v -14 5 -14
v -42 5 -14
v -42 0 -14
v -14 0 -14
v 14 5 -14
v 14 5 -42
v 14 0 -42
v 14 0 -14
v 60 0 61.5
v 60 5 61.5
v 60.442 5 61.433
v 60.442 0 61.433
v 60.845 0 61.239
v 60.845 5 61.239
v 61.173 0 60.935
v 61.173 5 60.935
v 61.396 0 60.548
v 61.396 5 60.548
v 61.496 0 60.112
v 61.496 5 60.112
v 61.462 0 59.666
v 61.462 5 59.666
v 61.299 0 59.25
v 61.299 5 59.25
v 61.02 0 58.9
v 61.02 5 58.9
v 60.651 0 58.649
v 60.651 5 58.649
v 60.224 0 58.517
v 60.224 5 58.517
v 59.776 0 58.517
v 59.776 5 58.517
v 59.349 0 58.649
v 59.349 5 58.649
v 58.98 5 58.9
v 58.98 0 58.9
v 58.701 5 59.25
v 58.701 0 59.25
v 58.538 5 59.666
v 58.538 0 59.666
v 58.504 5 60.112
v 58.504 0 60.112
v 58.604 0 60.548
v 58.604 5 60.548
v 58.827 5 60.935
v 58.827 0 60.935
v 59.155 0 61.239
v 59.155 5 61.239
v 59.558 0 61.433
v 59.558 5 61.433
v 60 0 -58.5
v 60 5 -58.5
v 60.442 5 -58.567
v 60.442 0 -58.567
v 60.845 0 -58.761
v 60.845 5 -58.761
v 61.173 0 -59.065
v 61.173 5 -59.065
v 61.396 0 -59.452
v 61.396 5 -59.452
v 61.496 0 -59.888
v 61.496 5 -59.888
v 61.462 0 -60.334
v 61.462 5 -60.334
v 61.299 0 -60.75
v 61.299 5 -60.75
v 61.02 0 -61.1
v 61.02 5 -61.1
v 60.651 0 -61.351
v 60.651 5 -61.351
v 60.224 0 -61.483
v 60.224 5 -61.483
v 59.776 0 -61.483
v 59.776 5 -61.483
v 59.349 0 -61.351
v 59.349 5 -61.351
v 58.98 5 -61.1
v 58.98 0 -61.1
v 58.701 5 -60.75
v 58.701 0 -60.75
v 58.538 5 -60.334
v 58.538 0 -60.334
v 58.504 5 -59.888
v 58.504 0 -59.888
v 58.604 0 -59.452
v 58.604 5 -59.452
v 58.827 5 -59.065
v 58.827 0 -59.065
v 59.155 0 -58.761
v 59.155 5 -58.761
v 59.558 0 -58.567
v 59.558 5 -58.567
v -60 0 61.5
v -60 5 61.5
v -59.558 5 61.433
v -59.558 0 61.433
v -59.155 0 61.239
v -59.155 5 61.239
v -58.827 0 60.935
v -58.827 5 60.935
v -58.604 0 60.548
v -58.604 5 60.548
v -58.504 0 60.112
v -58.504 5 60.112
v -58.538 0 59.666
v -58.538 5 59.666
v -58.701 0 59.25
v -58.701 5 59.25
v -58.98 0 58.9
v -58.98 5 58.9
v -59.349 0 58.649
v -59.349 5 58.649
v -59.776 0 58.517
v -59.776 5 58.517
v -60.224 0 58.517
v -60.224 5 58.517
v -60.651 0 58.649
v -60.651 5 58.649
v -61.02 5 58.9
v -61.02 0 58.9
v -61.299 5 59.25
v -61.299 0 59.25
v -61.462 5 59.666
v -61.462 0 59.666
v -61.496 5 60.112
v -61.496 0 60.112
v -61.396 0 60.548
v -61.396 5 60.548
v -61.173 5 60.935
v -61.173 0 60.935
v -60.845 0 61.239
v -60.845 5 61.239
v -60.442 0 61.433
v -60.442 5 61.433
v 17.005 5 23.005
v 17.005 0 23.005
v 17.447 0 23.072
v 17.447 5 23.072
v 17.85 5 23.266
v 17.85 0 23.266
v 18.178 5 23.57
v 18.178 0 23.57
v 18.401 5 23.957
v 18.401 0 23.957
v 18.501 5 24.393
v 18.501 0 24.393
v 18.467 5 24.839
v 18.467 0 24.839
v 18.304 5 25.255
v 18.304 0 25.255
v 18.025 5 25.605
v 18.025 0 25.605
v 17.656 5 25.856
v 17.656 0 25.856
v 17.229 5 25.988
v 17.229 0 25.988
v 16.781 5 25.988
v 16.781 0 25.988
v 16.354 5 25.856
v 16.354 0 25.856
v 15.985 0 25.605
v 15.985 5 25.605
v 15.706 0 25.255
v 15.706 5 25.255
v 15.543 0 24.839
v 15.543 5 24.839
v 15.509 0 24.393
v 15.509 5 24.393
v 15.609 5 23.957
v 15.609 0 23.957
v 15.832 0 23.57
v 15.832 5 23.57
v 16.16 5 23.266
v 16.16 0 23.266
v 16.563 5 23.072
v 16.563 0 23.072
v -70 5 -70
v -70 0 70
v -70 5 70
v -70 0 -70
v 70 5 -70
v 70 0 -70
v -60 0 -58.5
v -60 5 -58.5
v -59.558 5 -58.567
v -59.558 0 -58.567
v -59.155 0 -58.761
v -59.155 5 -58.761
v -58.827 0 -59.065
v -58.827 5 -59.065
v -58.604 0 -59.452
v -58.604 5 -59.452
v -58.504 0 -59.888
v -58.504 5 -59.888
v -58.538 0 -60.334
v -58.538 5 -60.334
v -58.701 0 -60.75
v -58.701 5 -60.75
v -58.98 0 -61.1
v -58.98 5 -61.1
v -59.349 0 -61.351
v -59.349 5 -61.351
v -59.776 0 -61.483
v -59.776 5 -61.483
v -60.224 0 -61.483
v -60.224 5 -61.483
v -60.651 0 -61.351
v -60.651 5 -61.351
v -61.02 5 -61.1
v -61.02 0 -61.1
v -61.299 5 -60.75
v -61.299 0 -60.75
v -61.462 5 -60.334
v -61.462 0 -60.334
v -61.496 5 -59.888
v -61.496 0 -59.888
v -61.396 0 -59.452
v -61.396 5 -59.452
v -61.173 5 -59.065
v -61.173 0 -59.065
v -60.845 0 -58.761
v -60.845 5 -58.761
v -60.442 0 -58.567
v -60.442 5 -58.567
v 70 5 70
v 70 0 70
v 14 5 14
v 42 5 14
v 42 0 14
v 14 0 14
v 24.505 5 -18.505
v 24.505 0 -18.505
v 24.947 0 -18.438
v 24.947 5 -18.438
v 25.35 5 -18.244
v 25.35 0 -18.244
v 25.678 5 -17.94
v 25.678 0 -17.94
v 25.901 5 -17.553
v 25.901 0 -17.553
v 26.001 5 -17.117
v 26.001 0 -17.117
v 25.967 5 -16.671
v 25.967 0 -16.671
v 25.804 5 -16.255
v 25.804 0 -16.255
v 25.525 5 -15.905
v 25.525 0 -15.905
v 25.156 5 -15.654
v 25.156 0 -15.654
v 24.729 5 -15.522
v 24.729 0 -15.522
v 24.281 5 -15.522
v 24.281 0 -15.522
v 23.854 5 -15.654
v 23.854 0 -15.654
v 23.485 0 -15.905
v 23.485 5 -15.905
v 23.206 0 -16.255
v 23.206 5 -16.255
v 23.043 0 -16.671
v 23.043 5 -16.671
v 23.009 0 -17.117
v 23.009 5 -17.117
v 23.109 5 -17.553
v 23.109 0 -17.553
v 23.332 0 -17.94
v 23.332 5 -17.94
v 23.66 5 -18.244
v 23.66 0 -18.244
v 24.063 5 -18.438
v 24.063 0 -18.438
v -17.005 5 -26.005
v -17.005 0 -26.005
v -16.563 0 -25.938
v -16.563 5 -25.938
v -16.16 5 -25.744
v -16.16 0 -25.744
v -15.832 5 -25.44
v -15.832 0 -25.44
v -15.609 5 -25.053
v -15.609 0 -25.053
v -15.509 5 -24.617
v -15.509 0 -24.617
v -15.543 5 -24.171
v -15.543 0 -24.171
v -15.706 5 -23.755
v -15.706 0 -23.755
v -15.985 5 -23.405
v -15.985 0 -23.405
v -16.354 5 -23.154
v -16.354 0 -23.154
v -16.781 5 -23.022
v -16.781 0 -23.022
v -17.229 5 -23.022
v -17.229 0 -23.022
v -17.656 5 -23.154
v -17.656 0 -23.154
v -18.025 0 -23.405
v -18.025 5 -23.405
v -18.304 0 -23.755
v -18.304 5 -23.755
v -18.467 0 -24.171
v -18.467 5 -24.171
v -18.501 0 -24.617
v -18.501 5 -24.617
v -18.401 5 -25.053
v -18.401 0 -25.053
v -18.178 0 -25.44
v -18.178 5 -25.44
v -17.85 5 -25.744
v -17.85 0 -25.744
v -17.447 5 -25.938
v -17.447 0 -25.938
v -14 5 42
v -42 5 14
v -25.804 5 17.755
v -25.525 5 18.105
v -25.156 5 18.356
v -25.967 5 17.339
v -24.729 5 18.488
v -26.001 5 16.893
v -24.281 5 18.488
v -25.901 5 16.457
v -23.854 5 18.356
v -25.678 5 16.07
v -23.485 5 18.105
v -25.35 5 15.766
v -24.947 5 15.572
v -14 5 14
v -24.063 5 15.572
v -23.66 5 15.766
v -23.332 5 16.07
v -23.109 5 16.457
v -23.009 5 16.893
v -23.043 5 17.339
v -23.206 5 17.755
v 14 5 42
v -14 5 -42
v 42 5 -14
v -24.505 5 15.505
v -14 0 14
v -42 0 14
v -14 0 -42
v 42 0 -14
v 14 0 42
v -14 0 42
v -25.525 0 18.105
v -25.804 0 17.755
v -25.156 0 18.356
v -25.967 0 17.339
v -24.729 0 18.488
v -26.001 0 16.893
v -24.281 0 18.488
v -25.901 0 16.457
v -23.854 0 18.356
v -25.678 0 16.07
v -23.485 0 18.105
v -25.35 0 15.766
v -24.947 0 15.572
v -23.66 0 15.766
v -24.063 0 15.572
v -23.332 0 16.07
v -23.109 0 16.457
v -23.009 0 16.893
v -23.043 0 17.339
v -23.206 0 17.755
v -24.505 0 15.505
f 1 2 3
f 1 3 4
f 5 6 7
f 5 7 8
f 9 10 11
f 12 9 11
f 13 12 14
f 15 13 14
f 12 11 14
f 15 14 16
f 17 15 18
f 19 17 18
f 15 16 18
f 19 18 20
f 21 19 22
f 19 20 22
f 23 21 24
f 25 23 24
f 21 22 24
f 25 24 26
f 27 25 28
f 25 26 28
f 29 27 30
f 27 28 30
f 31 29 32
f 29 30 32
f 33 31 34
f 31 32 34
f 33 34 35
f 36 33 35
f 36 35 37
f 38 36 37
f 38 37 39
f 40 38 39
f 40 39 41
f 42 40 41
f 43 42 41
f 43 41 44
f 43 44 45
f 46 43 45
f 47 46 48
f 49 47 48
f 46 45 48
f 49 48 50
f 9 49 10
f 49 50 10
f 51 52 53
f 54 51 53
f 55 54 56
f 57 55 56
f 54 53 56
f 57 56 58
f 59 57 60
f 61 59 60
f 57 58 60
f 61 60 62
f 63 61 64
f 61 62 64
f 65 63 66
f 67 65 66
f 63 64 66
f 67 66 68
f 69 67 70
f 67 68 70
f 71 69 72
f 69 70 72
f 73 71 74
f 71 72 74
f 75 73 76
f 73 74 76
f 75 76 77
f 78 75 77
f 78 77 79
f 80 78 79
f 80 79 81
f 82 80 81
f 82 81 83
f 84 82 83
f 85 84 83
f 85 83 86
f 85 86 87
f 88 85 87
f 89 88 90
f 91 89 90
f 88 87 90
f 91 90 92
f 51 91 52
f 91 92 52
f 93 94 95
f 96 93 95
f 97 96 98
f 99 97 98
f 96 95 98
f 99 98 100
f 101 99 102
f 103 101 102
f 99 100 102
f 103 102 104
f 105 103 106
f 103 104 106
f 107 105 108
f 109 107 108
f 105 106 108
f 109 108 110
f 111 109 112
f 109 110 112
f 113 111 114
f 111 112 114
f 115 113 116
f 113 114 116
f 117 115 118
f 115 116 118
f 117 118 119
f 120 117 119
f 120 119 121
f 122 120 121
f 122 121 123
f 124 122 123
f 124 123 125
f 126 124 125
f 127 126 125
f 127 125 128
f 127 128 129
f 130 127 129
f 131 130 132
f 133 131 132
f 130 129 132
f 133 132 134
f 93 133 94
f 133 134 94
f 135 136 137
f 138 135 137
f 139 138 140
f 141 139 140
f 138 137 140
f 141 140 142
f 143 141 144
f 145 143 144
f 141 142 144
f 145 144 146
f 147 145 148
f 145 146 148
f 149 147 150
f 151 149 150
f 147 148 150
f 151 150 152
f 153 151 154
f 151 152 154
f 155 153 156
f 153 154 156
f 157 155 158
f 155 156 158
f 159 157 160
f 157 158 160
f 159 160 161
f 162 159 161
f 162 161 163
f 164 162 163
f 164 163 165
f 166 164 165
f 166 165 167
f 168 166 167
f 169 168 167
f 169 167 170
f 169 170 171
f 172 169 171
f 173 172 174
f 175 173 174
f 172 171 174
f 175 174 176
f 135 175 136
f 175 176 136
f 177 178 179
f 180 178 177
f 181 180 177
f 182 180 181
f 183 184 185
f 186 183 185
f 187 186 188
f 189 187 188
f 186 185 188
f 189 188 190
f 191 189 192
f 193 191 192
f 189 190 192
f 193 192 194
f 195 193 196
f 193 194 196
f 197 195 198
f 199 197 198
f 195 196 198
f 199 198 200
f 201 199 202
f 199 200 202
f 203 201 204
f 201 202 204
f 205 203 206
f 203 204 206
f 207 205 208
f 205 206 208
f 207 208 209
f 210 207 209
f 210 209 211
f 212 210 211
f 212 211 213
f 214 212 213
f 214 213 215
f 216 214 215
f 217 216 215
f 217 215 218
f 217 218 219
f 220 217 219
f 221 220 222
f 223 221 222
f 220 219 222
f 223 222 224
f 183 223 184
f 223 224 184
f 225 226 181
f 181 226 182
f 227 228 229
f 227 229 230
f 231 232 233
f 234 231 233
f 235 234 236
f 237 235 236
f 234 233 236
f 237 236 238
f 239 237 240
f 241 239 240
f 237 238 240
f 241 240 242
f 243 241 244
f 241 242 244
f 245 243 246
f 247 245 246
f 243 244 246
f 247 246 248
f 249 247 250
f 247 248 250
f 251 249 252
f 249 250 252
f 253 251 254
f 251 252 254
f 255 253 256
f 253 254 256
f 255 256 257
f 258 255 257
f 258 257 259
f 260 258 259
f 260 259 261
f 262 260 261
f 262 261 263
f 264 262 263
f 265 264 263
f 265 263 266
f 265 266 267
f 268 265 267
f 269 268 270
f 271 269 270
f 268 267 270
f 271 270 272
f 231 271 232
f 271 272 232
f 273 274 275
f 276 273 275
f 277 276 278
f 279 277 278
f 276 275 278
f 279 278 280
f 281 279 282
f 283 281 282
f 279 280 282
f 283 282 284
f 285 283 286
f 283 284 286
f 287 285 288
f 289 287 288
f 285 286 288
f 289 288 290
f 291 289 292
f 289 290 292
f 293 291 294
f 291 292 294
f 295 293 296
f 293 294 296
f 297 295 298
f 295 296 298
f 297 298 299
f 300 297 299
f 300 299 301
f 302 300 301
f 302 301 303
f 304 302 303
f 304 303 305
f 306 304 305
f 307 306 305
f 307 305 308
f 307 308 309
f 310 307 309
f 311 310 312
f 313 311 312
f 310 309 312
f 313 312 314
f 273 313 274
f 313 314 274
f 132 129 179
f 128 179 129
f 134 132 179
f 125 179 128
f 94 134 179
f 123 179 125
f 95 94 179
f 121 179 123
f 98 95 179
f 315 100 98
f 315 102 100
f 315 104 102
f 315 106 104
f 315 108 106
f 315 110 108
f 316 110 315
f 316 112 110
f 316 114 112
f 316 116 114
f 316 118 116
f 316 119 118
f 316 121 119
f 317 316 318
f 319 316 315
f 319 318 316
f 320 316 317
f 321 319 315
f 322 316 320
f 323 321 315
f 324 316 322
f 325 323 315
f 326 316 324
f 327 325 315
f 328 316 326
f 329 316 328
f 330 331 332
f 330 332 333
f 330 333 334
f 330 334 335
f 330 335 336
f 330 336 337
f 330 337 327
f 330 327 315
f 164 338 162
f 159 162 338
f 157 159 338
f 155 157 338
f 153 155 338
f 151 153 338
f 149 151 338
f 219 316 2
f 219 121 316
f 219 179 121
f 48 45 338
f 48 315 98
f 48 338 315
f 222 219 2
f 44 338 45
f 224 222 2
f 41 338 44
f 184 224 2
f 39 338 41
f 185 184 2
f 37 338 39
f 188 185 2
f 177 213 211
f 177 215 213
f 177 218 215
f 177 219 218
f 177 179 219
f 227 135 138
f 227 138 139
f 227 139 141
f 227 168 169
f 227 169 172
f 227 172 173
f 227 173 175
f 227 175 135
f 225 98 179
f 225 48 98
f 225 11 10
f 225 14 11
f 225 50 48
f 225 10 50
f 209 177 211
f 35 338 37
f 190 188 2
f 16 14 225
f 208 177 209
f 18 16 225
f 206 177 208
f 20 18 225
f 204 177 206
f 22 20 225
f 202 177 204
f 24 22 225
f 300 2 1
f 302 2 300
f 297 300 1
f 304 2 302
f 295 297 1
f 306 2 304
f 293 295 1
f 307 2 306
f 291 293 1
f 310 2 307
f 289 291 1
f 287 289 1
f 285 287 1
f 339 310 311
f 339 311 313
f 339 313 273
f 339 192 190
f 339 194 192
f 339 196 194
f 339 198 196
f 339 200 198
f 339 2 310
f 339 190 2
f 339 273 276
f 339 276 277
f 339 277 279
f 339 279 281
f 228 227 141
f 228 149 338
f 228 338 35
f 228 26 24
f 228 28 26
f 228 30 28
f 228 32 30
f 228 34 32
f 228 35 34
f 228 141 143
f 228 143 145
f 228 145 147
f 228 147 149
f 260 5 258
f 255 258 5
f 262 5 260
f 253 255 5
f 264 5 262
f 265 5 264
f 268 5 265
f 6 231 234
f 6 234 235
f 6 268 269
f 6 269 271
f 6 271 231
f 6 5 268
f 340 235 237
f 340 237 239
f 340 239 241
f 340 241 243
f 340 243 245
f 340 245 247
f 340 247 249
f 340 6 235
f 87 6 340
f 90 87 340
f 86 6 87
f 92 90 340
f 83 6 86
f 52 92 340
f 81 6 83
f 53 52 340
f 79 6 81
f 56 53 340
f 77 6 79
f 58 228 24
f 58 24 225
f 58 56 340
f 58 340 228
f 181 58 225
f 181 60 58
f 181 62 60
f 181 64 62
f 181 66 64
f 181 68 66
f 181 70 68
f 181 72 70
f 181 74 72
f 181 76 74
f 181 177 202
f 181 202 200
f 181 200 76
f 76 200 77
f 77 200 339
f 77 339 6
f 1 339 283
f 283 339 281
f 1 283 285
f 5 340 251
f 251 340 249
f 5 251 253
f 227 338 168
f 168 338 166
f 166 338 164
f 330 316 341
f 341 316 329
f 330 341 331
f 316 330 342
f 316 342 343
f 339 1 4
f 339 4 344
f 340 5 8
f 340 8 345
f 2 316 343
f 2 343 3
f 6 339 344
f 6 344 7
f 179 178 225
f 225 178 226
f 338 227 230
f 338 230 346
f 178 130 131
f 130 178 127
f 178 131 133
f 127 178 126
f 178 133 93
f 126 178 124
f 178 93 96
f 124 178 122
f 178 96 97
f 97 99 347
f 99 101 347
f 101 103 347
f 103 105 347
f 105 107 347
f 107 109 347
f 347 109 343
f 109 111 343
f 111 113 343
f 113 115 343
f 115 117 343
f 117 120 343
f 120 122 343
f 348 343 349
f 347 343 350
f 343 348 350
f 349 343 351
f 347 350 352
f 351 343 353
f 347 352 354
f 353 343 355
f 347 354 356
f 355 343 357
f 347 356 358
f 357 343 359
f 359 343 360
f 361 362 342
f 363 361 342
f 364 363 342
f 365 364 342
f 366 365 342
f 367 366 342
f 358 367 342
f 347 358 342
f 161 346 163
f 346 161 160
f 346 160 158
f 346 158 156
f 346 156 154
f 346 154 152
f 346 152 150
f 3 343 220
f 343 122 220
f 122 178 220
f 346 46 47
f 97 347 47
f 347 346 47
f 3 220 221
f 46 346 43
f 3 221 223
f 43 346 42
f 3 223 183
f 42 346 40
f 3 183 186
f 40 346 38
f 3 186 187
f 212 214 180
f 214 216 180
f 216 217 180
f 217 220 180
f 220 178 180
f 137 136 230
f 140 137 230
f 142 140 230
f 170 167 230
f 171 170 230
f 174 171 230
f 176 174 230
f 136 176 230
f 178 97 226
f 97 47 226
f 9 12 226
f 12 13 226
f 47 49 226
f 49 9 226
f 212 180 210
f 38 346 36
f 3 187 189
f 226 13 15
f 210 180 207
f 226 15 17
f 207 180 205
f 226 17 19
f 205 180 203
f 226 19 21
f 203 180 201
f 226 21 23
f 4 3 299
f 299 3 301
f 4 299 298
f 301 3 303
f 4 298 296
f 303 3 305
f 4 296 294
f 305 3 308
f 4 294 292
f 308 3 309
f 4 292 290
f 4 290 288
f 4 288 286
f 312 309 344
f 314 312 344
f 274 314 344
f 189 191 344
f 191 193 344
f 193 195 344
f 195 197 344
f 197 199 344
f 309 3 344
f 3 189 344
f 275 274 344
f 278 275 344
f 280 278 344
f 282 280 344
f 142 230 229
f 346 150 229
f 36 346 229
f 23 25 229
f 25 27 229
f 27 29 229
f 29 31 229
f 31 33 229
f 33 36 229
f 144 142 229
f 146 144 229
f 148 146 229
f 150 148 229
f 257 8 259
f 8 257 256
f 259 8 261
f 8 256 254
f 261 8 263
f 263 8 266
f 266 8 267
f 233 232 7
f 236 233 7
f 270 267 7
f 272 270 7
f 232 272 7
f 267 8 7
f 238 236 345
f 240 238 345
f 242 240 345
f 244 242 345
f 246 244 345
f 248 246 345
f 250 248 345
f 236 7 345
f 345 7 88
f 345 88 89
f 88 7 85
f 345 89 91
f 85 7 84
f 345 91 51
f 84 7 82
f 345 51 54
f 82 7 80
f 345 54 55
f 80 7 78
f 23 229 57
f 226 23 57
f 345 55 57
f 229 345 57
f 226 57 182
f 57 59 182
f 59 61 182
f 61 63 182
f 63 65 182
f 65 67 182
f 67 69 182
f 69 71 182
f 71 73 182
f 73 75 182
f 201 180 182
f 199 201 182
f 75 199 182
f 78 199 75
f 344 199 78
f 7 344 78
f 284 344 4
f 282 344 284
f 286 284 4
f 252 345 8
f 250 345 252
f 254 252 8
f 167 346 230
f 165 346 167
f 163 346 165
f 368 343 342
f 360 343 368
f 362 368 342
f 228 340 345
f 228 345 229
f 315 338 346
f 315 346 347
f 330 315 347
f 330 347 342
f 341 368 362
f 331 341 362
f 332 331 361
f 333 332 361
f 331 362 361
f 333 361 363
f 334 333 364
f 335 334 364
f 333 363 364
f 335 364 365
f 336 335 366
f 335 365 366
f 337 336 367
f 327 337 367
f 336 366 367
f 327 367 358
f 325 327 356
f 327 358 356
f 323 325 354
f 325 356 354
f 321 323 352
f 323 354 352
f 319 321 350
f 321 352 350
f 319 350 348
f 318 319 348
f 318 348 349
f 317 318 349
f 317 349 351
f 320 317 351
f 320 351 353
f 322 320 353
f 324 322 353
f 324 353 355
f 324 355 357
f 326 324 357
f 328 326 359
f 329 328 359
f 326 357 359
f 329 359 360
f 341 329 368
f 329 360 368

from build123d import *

# Parameters (mm, degrees)
SKETCH1_W           = 140
SKETCH1_H           = 140
BOSS_EXTRUDE1_DEPTH = 5
SKETCH2_R           = 1.5
CUT_EXTRUDE1_DEPTH  = 5
CUT_EXTRUDE2_DEPTH  = 5
SKETCH6_R           = 1.5
CUT_EXTRUDE4_DEPTH  = 5


with BuildPart() as part:
    # Sketch1 → Boss-Extrude1 (new body)
    with BuildSketch(Plane(origin=(0, 0, 0), x_dir=(1, 0, 0), z_dir=(0, 1, 0))):
        Rectangle(SKETCH1_W, SKETCH1_H)
    extrude(amount=BOSS_EXTRUDE1_DEPTH)

    # Sketch2 → Cut-Extrude1 (cut)
    with BuildSketch(Plane.XZ):
        with Locations(Location((24.505, -17.005, 0), (0, 0, 270))):
            Circle(SKETCH2_R)
        with Locations(Location((-17.005, -24.505, 0), (0, 0, 270))):
            Circle(SKETCH2_R)
        with Locations(Location((-24.505, 17.005, 0), (0, 0, 270))):
            Circle(SKETCH2_R)
        with Locations(Location((17.005, 24.505, 0), (0, 0, 270))):
            Circle(SKETCH2_R)
    extrude(amount=-CUT_EXTRUDE1_DEPTH, mode=Mode.SUBTRACT)

    # Sketch4 → Cut-Extrude2 (cut)
    with BuildSketch(Plane(origin=(0, 5, 0), x_dir=(1, 0, 0), z_dir=(0, 1, 0))):
        Polygon((-14, 42), (14, 42), (14, 14), (42, 14), (42, -14), (14, -14), (14, -42), (-14, -42), (-14, -14), (-42, -14), (-42, 14), (-14, 14), align=None)
    extrude(amount=-CUT_EXTRUDE2_DEPTH, mode=Mode.SUBTRACT)

    # Sketch6 → Cut-Extrude4 (cut)
    with BuildSketch(Plane(origin=(0, 5, 0), x_dir=(1, 0, 0), z_dir=(0, 1, 0))):
        with Locations(Location((-60, 60, 0), (0, 0, 270))):
            Circle(SKETCH6_R)
        with Locations(Location((60, 60, 0), (0, 0, 270))):
            Circle(SKETCH6_R)
        with Locations(Location((60, -60, 0), (0, 0, 270))):
            Circle(SKETCH6_R)
        with Locations(Location((-60, -60, 0), (0, 0, 270))):
            Circle(SKETCH6_R)
    extrude(amount=-CUT_EXTRUDE4_DEPTH, mode=Mode.SUBTRACT)


solid = part.part
